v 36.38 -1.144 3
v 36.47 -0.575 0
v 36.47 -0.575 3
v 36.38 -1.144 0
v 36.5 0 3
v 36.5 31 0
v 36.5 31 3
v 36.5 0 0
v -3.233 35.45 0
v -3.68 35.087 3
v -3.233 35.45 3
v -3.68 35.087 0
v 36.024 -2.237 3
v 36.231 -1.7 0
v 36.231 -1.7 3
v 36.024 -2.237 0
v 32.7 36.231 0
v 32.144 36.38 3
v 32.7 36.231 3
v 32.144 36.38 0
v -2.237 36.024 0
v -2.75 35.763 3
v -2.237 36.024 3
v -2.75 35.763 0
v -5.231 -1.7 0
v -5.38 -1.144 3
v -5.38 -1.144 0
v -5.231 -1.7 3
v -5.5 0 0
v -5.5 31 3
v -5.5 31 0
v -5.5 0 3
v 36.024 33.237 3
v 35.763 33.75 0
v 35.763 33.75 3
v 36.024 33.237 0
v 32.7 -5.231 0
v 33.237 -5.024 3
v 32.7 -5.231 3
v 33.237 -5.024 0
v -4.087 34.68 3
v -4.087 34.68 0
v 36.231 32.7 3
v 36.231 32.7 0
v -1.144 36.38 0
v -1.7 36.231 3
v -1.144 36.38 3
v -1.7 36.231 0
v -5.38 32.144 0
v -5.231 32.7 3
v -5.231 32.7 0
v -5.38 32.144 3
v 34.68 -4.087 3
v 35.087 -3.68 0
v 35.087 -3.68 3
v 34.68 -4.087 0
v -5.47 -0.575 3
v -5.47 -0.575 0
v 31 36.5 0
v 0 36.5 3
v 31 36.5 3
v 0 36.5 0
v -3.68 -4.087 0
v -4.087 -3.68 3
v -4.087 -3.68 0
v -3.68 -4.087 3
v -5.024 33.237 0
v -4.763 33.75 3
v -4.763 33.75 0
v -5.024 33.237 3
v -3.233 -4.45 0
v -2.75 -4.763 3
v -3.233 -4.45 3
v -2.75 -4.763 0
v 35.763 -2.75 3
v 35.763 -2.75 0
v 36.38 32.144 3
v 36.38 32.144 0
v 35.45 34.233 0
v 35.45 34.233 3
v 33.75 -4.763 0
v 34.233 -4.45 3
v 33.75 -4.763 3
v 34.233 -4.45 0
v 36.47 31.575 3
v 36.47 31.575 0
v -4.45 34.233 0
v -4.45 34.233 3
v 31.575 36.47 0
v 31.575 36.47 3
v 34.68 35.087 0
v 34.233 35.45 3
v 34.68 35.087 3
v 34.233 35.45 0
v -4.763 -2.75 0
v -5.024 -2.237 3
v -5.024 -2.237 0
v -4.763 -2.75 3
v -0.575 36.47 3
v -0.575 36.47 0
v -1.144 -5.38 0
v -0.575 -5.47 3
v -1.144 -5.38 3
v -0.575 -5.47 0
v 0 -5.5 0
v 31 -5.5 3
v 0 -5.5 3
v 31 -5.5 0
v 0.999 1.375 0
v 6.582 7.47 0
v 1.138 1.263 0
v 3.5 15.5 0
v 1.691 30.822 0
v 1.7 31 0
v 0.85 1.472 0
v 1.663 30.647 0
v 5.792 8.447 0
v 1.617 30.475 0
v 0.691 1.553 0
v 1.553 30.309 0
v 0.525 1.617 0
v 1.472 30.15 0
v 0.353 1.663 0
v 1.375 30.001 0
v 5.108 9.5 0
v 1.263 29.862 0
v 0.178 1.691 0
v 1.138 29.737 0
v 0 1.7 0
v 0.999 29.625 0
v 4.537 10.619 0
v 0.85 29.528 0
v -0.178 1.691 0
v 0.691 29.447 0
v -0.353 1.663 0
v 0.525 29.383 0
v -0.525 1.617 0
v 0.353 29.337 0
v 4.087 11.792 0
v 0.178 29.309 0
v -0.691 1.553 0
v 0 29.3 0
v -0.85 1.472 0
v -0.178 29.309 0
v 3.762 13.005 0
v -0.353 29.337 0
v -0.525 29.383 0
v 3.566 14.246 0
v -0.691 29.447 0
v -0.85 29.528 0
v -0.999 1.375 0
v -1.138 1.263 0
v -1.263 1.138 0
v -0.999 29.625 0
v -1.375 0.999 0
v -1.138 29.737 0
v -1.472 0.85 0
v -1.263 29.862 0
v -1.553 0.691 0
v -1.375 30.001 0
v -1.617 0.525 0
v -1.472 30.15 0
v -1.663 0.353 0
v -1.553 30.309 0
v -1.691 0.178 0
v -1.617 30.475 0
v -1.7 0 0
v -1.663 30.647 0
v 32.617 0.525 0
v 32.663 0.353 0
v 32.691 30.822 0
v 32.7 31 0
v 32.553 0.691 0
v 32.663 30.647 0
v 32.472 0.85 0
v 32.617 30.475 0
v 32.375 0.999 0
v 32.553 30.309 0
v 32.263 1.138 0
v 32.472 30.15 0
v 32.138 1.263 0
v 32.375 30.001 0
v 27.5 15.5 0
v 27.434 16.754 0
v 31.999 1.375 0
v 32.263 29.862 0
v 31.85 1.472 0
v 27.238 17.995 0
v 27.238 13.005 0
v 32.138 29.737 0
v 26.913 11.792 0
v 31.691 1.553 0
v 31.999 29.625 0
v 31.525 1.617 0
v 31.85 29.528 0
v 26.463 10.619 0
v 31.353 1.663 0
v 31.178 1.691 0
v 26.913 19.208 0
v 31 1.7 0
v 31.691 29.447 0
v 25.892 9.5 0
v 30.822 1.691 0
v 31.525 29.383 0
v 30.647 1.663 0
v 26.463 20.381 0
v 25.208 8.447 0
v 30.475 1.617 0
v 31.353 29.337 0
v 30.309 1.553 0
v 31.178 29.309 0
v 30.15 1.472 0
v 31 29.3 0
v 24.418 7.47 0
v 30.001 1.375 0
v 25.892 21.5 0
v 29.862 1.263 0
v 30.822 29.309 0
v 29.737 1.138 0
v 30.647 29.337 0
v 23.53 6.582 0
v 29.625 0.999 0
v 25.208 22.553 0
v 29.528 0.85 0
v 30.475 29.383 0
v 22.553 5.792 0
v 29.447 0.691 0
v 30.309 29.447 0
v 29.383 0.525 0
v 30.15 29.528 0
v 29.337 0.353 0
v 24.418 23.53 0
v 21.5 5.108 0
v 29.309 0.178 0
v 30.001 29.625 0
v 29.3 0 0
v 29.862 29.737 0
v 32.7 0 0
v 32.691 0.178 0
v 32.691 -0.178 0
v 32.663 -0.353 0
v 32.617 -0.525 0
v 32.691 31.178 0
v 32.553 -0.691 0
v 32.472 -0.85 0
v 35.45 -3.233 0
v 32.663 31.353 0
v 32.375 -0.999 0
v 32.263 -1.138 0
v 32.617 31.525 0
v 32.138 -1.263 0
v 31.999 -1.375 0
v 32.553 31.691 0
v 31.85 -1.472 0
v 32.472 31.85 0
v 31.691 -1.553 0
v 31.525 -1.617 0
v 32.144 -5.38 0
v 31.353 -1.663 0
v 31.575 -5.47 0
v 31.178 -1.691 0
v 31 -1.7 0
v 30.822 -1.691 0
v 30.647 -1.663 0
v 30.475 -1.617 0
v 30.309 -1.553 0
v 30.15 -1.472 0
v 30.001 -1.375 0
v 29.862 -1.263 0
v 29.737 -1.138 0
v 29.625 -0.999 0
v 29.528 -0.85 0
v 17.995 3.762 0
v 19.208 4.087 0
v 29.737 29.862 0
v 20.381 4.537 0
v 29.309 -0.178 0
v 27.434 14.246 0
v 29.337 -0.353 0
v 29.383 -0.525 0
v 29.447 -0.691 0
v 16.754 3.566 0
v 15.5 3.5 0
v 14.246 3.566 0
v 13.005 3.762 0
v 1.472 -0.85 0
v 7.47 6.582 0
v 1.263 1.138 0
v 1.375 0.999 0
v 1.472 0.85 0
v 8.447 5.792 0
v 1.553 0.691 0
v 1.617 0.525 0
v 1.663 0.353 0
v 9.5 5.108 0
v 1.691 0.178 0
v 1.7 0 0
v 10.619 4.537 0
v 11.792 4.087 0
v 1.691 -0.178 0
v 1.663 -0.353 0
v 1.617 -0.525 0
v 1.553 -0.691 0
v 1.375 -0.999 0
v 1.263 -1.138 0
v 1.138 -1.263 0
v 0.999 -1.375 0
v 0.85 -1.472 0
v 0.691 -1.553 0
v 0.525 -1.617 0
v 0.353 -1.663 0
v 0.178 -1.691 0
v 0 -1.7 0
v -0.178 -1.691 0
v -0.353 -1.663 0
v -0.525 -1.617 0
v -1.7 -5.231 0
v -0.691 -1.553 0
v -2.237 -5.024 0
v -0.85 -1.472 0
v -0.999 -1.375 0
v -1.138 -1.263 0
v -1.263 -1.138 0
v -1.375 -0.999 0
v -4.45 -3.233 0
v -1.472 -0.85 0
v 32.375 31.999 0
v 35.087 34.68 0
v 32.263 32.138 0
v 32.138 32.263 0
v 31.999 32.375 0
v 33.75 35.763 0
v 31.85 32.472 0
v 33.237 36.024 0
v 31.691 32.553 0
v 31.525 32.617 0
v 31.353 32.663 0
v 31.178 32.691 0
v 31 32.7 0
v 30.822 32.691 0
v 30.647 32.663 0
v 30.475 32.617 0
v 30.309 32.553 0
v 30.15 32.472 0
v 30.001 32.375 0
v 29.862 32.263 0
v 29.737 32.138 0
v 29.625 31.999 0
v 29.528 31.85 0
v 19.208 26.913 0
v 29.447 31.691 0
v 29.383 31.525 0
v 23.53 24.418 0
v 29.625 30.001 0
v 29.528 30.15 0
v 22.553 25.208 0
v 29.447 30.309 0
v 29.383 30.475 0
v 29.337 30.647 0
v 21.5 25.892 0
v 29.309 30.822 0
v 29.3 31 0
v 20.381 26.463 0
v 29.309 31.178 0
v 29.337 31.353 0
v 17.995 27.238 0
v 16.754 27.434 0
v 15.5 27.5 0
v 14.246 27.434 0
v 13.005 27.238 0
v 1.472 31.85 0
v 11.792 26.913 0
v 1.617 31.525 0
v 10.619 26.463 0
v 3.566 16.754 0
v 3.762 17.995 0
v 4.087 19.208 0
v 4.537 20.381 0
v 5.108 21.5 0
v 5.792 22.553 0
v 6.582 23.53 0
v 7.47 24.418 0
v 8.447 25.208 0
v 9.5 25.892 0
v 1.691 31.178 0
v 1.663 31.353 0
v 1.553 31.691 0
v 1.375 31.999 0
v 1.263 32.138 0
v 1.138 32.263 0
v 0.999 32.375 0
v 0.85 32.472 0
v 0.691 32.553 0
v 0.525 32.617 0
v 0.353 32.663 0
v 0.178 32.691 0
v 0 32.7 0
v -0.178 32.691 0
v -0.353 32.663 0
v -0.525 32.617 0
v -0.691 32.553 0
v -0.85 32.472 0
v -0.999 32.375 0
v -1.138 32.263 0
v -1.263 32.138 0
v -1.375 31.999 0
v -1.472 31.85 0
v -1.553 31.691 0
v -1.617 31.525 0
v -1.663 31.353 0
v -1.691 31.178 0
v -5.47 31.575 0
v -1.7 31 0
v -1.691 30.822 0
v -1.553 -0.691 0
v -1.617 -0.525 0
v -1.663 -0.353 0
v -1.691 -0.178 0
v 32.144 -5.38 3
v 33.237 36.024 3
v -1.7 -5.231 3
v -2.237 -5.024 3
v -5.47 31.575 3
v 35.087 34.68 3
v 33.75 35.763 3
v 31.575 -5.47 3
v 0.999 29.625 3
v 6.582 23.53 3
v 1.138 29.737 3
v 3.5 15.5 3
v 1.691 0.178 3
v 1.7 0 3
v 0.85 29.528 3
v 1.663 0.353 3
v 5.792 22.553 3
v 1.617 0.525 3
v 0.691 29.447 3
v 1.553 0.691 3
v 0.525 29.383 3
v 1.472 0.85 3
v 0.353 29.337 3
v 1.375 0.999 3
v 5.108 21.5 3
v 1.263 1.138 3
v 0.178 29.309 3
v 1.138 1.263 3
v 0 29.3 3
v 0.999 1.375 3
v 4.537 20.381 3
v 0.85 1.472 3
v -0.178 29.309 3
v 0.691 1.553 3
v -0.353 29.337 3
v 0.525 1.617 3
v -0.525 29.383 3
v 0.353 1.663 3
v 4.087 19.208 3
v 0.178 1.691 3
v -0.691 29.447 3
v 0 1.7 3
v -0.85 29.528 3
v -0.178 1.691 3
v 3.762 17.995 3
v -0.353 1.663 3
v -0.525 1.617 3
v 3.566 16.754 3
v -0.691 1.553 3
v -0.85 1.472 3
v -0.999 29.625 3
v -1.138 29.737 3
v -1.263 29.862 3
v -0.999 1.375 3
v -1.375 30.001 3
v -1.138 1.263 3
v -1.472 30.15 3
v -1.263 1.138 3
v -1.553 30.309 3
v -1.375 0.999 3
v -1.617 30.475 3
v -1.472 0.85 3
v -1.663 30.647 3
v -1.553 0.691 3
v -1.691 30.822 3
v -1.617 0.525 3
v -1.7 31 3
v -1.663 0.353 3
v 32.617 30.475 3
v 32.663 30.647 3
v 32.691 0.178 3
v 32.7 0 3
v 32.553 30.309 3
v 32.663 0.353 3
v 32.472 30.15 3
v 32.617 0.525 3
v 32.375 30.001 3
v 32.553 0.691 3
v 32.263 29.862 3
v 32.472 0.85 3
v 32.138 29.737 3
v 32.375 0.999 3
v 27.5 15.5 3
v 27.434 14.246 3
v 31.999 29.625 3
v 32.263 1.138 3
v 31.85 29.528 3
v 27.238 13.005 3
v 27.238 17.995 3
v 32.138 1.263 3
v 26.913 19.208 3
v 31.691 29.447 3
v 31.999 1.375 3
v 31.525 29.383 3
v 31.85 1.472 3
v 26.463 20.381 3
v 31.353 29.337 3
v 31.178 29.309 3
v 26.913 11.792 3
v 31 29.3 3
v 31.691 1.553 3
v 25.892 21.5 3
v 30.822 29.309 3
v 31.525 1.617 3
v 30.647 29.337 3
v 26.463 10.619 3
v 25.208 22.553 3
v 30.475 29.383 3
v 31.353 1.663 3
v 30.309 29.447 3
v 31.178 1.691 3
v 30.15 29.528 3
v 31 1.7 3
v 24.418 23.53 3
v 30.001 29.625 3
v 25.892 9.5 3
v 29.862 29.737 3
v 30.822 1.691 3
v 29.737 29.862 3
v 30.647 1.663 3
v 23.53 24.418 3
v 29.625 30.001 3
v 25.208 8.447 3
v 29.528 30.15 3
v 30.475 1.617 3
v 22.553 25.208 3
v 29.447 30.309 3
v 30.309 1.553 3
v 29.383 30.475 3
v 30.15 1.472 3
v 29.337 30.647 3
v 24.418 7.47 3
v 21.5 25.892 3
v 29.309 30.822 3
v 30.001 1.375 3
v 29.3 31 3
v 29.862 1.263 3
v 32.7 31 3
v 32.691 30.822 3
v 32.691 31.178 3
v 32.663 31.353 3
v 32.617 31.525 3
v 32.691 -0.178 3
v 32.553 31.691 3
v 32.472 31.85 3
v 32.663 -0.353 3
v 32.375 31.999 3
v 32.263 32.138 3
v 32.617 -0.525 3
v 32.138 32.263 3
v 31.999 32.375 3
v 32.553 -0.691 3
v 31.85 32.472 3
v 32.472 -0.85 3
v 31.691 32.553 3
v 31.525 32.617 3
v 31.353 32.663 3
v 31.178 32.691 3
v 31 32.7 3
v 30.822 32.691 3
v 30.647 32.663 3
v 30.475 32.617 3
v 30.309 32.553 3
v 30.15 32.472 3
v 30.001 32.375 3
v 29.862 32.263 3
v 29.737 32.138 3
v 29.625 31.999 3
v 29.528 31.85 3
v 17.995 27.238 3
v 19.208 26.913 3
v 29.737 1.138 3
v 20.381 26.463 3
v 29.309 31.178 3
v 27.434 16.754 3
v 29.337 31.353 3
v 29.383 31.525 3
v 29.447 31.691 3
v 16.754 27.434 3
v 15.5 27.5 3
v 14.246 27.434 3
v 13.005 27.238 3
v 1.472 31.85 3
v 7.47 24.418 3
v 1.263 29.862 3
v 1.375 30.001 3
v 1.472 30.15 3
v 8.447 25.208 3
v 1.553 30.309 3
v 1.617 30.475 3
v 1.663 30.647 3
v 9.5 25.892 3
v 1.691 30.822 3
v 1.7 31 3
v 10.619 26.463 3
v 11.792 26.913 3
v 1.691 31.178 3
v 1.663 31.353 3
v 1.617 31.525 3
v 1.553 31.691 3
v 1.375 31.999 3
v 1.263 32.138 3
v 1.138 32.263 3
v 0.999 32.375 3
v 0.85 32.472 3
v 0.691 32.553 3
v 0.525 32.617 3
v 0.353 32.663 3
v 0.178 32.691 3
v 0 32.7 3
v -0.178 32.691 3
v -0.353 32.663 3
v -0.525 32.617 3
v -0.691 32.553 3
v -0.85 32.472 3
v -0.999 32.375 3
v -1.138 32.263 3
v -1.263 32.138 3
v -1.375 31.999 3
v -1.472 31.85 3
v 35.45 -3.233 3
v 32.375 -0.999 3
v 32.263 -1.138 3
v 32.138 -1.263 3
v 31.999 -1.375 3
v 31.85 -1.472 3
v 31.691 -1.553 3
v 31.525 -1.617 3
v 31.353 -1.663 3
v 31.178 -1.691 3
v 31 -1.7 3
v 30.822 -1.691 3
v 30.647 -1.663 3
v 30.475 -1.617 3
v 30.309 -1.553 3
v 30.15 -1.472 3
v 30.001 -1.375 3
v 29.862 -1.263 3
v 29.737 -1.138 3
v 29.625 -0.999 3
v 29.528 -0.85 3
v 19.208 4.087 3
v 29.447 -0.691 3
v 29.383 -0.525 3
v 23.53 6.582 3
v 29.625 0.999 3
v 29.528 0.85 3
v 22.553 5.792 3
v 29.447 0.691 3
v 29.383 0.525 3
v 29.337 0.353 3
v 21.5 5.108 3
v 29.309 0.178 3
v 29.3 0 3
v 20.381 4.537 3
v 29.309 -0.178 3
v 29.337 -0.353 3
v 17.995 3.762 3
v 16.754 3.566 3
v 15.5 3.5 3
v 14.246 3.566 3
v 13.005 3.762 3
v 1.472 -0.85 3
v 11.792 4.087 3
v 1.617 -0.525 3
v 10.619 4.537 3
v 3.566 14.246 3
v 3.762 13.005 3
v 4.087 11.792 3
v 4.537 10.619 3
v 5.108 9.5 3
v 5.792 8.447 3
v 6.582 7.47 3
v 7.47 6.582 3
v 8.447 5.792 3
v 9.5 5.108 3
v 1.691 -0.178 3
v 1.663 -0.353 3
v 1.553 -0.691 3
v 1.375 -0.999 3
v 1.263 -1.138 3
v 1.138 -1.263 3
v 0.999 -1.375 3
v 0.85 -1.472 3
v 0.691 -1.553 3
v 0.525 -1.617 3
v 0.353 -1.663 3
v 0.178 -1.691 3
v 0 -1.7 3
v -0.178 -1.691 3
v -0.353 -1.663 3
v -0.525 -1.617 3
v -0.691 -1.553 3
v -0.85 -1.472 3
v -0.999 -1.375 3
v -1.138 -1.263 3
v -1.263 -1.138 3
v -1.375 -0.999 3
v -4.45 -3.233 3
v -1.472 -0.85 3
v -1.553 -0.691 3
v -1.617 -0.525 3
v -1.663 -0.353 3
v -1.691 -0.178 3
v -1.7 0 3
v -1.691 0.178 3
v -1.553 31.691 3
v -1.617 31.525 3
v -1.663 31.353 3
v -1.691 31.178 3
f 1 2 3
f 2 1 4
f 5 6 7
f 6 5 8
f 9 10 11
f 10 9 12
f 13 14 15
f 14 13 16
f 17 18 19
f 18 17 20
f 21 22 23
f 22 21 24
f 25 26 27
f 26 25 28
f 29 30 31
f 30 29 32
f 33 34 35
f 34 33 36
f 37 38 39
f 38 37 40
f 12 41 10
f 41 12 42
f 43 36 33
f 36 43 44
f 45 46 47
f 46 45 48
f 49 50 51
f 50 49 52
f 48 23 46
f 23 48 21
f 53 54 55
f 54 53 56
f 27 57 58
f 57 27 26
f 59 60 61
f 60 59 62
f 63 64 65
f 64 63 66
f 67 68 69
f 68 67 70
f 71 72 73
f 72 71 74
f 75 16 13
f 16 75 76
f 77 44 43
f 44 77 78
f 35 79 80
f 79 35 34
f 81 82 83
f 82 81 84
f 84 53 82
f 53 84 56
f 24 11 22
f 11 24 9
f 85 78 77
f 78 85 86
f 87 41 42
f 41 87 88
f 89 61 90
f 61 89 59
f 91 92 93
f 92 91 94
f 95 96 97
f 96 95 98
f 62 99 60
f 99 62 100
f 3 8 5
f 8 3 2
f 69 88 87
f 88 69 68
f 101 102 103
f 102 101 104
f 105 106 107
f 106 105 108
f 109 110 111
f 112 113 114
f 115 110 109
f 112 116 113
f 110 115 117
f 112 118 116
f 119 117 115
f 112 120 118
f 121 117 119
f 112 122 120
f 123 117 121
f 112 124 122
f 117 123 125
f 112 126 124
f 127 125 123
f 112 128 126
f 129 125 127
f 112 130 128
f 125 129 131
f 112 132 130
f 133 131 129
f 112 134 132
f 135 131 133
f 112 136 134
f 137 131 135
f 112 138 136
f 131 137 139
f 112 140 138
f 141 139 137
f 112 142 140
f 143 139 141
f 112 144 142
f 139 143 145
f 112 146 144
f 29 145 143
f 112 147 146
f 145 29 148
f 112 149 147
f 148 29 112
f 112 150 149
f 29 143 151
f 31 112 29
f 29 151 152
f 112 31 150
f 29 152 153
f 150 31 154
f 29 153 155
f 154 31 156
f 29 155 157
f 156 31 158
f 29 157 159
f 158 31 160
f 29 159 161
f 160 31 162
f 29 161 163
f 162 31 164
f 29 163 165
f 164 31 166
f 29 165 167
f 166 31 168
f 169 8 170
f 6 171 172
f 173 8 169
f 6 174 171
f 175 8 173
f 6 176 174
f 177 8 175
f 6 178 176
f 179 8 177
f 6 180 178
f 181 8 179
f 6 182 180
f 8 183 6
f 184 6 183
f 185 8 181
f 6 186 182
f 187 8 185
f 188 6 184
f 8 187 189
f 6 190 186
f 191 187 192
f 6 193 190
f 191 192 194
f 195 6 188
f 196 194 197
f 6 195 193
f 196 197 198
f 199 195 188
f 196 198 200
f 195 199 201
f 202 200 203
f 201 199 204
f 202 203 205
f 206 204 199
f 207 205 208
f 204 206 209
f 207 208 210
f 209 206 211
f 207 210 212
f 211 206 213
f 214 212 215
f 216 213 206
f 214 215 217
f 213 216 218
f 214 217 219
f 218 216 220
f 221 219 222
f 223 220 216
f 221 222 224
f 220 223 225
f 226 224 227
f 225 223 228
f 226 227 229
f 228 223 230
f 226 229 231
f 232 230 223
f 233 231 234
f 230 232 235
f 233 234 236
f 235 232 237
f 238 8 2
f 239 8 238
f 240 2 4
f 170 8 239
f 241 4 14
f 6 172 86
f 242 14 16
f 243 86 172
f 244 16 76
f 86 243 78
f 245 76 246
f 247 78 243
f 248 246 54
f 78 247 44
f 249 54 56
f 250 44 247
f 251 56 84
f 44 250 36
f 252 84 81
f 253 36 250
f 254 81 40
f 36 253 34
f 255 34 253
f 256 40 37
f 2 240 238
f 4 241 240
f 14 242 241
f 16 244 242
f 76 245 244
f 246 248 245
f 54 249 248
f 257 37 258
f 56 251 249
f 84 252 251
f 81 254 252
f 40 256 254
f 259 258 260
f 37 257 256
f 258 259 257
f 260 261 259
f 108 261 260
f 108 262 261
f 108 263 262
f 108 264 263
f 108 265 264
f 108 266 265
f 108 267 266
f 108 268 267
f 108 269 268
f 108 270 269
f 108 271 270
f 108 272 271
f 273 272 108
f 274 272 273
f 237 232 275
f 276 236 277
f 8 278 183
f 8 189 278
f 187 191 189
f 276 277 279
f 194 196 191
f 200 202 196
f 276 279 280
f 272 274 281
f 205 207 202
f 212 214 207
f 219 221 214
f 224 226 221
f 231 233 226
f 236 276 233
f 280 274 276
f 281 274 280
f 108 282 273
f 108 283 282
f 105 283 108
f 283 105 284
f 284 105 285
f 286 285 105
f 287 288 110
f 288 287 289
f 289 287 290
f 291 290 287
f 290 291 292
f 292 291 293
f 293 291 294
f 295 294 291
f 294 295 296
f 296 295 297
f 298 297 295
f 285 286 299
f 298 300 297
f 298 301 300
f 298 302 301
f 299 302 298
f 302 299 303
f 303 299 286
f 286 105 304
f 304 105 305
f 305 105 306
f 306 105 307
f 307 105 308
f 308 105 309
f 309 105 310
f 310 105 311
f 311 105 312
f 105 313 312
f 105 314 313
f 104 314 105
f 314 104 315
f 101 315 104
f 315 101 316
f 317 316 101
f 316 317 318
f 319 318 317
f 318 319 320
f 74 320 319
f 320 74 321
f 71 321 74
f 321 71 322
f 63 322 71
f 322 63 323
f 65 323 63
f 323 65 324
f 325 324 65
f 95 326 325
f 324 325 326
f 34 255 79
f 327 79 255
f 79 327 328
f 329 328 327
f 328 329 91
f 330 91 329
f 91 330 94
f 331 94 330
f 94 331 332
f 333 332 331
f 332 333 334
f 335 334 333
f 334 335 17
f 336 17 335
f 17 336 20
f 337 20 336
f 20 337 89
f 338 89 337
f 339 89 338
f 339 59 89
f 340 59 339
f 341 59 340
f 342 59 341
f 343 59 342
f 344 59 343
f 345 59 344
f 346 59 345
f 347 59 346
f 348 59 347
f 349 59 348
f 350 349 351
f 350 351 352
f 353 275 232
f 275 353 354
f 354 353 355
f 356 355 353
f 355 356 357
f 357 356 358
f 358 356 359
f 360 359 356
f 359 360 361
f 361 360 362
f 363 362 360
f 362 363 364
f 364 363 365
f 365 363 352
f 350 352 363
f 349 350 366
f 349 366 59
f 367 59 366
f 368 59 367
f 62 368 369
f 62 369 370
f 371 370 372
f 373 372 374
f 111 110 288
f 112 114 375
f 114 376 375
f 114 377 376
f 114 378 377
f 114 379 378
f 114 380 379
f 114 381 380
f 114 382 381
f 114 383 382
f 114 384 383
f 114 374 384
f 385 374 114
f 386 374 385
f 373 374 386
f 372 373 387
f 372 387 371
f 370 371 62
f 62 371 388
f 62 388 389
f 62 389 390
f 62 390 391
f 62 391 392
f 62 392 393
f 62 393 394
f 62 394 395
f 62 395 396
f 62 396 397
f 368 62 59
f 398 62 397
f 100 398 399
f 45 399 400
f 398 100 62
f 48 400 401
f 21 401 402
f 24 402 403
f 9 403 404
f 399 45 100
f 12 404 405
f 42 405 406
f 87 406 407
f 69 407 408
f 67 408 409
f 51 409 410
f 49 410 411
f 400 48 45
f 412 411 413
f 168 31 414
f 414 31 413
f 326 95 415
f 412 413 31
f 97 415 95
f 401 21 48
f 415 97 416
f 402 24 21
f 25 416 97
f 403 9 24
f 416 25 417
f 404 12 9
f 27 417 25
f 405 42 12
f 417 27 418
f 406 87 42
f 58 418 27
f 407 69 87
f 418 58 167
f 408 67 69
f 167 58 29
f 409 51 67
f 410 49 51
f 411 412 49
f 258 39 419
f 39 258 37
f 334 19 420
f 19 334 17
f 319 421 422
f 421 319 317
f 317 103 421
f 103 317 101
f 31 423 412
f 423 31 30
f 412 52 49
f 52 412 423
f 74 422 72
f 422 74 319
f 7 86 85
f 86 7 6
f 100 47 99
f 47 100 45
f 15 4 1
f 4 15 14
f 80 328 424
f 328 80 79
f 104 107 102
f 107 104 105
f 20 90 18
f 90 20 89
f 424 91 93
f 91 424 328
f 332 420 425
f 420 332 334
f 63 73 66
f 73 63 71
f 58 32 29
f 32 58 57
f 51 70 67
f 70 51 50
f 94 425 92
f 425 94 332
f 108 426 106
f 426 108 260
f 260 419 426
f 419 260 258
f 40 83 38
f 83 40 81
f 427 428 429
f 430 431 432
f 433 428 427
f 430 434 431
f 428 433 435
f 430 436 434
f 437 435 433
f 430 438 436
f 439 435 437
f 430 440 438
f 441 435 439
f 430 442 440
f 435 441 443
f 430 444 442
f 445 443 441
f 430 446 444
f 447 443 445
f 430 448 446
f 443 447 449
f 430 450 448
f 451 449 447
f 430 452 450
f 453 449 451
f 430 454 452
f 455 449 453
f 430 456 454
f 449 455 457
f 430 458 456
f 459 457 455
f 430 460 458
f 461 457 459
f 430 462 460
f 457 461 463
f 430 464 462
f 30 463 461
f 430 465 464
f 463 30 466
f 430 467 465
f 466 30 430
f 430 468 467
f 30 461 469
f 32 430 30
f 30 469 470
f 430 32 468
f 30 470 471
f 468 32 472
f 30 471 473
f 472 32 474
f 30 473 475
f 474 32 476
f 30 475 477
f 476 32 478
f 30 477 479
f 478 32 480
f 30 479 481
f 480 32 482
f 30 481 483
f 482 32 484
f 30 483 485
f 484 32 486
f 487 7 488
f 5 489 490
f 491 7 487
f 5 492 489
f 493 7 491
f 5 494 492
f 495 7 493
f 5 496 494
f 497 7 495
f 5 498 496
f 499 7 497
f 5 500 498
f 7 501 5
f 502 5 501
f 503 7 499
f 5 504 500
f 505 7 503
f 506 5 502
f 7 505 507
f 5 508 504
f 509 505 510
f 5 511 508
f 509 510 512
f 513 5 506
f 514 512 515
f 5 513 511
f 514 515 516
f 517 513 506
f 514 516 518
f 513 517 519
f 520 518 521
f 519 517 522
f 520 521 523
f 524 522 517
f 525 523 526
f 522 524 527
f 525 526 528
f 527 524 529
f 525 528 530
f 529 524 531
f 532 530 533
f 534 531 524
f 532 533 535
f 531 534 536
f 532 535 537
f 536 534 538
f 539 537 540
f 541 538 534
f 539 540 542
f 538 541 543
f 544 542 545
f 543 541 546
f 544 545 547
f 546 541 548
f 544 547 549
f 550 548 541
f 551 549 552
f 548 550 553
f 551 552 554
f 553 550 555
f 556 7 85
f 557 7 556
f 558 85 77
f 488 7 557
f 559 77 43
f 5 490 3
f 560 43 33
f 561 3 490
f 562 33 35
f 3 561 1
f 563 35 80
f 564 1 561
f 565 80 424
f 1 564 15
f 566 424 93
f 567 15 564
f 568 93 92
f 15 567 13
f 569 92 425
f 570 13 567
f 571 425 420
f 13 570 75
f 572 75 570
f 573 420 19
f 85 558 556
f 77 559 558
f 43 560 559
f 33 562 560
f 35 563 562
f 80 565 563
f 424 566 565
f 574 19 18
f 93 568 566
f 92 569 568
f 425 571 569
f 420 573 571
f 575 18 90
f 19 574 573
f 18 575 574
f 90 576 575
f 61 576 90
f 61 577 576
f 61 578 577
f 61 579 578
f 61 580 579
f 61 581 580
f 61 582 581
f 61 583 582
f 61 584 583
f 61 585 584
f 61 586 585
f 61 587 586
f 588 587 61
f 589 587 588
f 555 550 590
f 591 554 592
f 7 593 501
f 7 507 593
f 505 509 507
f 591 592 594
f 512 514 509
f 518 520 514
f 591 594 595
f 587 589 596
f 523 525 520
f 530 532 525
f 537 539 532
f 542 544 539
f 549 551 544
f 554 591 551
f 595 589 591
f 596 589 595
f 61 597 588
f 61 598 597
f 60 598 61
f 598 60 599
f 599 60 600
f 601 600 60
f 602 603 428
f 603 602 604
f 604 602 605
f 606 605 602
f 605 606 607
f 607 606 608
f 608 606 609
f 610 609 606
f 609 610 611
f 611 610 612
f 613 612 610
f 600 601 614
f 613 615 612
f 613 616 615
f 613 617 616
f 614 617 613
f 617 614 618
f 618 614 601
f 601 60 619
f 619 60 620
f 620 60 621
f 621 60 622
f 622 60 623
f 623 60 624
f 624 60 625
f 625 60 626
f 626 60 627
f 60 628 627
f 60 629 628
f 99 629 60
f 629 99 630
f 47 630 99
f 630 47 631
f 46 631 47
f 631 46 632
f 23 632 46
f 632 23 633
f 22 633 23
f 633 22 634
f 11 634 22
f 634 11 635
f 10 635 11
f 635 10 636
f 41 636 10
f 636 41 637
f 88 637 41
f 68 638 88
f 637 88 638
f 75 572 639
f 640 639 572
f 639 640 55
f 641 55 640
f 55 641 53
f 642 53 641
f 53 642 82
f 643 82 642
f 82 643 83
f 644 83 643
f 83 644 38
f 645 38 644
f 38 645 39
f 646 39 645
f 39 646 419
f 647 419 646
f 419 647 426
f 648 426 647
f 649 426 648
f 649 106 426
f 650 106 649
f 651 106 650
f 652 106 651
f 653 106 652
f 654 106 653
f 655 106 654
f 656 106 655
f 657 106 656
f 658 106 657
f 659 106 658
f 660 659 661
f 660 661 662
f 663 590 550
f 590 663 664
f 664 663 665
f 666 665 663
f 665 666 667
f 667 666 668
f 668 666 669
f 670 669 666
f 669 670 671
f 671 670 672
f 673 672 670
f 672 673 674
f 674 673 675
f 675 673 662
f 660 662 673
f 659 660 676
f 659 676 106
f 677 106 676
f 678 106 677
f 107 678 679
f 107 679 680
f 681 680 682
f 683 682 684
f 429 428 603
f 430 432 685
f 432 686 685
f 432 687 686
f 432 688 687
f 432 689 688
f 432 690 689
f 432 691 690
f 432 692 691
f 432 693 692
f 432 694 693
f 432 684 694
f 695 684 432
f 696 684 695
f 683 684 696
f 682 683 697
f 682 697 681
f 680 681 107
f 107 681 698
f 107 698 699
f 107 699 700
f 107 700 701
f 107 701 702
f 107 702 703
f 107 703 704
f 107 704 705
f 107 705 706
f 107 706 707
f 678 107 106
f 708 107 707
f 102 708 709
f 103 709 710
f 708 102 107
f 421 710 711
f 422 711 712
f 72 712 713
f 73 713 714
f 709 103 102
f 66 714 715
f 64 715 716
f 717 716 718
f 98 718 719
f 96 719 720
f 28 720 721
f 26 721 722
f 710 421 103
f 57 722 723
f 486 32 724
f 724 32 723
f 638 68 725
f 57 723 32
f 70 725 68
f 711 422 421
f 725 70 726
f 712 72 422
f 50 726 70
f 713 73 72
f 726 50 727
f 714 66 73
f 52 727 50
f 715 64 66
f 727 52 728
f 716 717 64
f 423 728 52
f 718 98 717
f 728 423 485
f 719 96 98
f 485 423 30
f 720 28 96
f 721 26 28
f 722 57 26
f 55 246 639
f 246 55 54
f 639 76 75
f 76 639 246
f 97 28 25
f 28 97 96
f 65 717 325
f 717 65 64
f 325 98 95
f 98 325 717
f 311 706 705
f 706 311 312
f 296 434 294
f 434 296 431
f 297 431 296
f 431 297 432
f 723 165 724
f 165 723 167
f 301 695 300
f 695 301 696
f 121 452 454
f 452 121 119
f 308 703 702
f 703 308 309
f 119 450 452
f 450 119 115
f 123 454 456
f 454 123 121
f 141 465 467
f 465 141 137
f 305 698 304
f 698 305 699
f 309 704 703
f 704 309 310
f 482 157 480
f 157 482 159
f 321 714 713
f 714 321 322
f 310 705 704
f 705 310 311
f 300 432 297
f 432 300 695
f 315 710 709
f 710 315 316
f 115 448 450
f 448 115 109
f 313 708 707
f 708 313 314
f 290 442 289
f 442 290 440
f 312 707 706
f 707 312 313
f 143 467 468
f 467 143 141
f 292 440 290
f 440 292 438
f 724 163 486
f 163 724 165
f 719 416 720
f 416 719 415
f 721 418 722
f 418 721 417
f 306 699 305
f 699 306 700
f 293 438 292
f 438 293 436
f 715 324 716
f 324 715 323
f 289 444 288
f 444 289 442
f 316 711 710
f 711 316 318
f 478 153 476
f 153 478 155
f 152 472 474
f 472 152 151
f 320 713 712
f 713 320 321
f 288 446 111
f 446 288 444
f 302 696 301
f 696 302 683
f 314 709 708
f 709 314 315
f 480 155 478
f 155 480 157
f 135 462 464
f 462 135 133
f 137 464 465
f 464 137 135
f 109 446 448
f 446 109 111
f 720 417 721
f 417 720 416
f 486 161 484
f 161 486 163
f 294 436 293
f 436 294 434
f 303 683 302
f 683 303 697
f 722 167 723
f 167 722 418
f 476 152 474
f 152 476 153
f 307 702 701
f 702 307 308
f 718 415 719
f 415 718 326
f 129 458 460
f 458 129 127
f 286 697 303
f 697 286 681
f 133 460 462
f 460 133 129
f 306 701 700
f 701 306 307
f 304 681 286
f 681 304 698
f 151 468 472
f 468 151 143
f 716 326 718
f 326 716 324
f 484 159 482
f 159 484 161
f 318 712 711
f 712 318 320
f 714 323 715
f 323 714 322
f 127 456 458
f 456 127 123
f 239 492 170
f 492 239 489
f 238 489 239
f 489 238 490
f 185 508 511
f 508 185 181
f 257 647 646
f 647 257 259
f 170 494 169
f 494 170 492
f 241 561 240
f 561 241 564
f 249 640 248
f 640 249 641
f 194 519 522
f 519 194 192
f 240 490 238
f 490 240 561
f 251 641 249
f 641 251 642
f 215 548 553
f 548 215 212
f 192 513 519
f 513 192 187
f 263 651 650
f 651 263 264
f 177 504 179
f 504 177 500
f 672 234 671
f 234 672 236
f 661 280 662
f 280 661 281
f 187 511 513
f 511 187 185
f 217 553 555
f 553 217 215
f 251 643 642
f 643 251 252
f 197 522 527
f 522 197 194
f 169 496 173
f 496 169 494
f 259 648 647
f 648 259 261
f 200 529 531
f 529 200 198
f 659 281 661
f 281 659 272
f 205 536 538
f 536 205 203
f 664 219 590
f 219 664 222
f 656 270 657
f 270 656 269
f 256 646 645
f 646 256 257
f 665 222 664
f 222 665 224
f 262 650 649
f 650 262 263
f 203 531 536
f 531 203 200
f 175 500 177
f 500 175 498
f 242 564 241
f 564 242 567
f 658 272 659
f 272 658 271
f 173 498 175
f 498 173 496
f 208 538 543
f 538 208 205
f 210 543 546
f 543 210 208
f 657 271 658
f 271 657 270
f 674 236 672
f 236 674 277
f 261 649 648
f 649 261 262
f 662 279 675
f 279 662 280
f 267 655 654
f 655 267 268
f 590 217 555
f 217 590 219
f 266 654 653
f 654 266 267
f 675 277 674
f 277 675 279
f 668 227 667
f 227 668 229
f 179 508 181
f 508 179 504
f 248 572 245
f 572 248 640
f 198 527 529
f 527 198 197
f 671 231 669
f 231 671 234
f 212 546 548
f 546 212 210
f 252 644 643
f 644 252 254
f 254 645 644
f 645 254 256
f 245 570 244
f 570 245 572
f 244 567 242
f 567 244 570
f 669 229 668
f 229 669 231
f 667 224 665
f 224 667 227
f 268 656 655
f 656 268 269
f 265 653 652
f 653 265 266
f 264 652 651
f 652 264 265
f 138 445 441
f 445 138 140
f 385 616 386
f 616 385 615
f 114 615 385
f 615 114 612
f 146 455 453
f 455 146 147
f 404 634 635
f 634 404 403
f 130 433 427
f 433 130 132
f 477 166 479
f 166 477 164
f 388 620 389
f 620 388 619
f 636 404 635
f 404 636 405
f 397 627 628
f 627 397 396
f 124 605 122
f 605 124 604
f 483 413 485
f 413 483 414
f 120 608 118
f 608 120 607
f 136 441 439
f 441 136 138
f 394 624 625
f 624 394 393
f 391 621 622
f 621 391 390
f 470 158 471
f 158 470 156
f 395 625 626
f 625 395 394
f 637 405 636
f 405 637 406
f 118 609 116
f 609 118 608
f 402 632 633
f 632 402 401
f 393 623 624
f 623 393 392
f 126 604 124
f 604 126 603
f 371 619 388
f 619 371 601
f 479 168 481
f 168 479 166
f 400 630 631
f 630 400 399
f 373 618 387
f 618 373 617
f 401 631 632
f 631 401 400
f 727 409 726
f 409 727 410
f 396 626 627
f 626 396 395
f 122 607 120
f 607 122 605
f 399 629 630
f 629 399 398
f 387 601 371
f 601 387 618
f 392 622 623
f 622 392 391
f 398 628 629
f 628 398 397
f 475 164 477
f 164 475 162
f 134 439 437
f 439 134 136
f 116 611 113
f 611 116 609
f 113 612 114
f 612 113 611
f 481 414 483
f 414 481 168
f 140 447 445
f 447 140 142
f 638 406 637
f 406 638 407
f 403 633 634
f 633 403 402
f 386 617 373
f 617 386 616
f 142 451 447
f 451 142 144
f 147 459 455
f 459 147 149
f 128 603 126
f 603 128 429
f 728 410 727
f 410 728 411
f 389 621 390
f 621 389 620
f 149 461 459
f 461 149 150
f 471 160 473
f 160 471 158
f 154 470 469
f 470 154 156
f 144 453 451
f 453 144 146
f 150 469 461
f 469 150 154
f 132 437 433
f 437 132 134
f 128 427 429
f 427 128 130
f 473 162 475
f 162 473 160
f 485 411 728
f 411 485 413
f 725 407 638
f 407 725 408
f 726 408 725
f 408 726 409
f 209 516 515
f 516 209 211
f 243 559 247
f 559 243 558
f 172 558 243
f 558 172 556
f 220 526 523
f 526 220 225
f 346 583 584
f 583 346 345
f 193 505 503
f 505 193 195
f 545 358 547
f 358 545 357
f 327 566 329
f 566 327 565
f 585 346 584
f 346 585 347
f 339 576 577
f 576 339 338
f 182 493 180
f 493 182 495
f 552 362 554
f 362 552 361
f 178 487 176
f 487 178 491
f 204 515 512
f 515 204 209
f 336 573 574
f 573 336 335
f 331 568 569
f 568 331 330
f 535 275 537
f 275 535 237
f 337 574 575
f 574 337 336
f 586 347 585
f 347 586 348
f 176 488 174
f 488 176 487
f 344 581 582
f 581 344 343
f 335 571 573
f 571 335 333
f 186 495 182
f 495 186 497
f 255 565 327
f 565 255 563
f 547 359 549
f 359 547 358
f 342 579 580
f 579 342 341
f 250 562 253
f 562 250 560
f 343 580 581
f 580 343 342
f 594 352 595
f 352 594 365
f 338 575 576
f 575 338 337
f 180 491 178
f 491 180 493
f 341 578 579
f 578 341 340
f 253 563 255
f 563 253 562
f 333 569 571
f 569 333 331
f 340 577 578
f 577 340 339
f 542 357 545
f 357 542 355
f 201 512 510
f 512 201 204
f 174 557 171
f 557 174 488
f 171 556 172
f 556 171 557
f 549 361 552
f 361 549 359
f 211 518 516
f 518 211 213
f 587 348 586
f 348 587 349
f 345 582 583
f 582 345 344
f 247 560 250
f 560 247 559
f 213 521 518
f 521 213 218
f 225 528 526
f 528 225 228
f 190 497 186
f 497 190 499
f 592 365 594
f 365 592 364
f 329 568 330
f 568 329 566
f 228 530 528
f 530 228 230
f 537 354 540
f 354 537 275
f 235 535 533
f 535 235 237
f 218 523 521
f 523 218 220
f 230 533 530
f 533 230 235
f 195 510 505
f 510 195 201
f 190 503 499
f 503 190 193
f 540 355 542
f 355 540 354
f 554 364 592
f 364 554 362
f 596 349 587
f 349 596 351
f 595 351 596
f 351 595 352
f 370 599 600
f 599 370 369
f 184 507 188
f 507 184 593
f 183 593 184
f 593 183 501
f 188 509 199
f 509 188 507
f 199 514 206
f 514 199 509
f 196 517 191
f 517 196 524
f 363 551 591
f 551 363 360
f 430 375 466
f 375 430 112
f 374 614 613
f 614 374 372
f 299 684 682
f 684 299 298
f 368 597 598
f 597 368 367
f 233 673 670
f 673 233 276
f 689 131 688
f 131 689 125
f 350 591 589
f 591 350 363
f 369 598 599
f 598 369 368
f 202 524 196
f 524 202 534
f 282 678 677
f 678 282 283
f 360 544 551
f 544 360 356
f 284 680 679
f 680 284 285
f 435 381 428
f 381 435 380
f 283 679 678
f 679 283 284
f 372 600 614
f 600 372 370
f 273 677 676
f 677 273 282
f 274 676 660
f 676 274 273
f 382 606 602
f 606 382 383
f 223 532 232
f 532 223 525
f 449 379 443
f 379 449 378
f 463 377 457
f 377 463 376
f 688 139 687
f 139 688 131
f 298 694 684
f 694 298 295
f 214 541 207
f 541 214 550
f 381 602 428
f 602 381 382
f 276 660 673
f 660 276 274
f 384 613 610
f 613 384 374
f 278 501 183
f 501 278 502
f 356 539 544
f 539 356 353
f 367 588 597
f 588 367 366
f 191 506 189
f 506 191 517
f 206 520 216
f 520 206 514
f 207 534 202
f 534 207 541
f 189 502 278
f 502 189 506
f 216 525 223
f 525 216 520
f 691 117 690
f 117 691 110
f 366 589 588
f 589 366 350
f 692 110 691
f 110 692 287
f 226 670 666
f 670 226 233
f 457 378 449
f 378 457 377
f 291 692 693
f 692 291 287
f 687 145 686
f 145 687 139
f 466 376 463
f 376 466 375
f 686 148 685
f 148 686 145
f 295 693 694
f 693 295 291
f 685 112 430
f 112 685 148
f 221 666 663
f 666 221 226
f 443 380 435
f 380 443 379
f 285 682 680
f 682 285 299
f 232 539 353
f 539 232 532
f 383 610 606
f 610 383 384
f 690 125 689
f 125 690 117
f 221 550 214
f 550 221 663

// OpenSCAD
// Fork from https://www.thingiverse.com/thing:713203/file
// by VincentM is licensed under the Creative Commons - Attribution - Share Alike license.

// Height of the gasket
height = 3;

// Roundness
$fn=60; 

difference() {
        // Hull
        hull() {
			translate ([0,0,0]) cylinder (r=5.5,h=height);
			translate ([31,0,0]) cylinder (r=5.5,h=height);
			translate ([0,31,0]) cylinder (r=5.5,h=height);
			translate ([31,31,0]) cylinder (r=5.5,h=height);
        }

        // Bolt holes
		translate ([0,0,0-.01]) cylinder (r=1.7,h=height+.02);
		translate ([31,0,0-.01]) cylinder (r=1.7,h=height+.02);
		translate ([0,31,0-.01]) cylinder (r=1.7,h=height+.02);
		translate ([31,31,0-.01]) cylinder (r=1.7,h=height+.02);
        
        // Center Hole
        translate ([15.5,15.5,-.01]) cylinder (r=12,h=height+.02);
}
